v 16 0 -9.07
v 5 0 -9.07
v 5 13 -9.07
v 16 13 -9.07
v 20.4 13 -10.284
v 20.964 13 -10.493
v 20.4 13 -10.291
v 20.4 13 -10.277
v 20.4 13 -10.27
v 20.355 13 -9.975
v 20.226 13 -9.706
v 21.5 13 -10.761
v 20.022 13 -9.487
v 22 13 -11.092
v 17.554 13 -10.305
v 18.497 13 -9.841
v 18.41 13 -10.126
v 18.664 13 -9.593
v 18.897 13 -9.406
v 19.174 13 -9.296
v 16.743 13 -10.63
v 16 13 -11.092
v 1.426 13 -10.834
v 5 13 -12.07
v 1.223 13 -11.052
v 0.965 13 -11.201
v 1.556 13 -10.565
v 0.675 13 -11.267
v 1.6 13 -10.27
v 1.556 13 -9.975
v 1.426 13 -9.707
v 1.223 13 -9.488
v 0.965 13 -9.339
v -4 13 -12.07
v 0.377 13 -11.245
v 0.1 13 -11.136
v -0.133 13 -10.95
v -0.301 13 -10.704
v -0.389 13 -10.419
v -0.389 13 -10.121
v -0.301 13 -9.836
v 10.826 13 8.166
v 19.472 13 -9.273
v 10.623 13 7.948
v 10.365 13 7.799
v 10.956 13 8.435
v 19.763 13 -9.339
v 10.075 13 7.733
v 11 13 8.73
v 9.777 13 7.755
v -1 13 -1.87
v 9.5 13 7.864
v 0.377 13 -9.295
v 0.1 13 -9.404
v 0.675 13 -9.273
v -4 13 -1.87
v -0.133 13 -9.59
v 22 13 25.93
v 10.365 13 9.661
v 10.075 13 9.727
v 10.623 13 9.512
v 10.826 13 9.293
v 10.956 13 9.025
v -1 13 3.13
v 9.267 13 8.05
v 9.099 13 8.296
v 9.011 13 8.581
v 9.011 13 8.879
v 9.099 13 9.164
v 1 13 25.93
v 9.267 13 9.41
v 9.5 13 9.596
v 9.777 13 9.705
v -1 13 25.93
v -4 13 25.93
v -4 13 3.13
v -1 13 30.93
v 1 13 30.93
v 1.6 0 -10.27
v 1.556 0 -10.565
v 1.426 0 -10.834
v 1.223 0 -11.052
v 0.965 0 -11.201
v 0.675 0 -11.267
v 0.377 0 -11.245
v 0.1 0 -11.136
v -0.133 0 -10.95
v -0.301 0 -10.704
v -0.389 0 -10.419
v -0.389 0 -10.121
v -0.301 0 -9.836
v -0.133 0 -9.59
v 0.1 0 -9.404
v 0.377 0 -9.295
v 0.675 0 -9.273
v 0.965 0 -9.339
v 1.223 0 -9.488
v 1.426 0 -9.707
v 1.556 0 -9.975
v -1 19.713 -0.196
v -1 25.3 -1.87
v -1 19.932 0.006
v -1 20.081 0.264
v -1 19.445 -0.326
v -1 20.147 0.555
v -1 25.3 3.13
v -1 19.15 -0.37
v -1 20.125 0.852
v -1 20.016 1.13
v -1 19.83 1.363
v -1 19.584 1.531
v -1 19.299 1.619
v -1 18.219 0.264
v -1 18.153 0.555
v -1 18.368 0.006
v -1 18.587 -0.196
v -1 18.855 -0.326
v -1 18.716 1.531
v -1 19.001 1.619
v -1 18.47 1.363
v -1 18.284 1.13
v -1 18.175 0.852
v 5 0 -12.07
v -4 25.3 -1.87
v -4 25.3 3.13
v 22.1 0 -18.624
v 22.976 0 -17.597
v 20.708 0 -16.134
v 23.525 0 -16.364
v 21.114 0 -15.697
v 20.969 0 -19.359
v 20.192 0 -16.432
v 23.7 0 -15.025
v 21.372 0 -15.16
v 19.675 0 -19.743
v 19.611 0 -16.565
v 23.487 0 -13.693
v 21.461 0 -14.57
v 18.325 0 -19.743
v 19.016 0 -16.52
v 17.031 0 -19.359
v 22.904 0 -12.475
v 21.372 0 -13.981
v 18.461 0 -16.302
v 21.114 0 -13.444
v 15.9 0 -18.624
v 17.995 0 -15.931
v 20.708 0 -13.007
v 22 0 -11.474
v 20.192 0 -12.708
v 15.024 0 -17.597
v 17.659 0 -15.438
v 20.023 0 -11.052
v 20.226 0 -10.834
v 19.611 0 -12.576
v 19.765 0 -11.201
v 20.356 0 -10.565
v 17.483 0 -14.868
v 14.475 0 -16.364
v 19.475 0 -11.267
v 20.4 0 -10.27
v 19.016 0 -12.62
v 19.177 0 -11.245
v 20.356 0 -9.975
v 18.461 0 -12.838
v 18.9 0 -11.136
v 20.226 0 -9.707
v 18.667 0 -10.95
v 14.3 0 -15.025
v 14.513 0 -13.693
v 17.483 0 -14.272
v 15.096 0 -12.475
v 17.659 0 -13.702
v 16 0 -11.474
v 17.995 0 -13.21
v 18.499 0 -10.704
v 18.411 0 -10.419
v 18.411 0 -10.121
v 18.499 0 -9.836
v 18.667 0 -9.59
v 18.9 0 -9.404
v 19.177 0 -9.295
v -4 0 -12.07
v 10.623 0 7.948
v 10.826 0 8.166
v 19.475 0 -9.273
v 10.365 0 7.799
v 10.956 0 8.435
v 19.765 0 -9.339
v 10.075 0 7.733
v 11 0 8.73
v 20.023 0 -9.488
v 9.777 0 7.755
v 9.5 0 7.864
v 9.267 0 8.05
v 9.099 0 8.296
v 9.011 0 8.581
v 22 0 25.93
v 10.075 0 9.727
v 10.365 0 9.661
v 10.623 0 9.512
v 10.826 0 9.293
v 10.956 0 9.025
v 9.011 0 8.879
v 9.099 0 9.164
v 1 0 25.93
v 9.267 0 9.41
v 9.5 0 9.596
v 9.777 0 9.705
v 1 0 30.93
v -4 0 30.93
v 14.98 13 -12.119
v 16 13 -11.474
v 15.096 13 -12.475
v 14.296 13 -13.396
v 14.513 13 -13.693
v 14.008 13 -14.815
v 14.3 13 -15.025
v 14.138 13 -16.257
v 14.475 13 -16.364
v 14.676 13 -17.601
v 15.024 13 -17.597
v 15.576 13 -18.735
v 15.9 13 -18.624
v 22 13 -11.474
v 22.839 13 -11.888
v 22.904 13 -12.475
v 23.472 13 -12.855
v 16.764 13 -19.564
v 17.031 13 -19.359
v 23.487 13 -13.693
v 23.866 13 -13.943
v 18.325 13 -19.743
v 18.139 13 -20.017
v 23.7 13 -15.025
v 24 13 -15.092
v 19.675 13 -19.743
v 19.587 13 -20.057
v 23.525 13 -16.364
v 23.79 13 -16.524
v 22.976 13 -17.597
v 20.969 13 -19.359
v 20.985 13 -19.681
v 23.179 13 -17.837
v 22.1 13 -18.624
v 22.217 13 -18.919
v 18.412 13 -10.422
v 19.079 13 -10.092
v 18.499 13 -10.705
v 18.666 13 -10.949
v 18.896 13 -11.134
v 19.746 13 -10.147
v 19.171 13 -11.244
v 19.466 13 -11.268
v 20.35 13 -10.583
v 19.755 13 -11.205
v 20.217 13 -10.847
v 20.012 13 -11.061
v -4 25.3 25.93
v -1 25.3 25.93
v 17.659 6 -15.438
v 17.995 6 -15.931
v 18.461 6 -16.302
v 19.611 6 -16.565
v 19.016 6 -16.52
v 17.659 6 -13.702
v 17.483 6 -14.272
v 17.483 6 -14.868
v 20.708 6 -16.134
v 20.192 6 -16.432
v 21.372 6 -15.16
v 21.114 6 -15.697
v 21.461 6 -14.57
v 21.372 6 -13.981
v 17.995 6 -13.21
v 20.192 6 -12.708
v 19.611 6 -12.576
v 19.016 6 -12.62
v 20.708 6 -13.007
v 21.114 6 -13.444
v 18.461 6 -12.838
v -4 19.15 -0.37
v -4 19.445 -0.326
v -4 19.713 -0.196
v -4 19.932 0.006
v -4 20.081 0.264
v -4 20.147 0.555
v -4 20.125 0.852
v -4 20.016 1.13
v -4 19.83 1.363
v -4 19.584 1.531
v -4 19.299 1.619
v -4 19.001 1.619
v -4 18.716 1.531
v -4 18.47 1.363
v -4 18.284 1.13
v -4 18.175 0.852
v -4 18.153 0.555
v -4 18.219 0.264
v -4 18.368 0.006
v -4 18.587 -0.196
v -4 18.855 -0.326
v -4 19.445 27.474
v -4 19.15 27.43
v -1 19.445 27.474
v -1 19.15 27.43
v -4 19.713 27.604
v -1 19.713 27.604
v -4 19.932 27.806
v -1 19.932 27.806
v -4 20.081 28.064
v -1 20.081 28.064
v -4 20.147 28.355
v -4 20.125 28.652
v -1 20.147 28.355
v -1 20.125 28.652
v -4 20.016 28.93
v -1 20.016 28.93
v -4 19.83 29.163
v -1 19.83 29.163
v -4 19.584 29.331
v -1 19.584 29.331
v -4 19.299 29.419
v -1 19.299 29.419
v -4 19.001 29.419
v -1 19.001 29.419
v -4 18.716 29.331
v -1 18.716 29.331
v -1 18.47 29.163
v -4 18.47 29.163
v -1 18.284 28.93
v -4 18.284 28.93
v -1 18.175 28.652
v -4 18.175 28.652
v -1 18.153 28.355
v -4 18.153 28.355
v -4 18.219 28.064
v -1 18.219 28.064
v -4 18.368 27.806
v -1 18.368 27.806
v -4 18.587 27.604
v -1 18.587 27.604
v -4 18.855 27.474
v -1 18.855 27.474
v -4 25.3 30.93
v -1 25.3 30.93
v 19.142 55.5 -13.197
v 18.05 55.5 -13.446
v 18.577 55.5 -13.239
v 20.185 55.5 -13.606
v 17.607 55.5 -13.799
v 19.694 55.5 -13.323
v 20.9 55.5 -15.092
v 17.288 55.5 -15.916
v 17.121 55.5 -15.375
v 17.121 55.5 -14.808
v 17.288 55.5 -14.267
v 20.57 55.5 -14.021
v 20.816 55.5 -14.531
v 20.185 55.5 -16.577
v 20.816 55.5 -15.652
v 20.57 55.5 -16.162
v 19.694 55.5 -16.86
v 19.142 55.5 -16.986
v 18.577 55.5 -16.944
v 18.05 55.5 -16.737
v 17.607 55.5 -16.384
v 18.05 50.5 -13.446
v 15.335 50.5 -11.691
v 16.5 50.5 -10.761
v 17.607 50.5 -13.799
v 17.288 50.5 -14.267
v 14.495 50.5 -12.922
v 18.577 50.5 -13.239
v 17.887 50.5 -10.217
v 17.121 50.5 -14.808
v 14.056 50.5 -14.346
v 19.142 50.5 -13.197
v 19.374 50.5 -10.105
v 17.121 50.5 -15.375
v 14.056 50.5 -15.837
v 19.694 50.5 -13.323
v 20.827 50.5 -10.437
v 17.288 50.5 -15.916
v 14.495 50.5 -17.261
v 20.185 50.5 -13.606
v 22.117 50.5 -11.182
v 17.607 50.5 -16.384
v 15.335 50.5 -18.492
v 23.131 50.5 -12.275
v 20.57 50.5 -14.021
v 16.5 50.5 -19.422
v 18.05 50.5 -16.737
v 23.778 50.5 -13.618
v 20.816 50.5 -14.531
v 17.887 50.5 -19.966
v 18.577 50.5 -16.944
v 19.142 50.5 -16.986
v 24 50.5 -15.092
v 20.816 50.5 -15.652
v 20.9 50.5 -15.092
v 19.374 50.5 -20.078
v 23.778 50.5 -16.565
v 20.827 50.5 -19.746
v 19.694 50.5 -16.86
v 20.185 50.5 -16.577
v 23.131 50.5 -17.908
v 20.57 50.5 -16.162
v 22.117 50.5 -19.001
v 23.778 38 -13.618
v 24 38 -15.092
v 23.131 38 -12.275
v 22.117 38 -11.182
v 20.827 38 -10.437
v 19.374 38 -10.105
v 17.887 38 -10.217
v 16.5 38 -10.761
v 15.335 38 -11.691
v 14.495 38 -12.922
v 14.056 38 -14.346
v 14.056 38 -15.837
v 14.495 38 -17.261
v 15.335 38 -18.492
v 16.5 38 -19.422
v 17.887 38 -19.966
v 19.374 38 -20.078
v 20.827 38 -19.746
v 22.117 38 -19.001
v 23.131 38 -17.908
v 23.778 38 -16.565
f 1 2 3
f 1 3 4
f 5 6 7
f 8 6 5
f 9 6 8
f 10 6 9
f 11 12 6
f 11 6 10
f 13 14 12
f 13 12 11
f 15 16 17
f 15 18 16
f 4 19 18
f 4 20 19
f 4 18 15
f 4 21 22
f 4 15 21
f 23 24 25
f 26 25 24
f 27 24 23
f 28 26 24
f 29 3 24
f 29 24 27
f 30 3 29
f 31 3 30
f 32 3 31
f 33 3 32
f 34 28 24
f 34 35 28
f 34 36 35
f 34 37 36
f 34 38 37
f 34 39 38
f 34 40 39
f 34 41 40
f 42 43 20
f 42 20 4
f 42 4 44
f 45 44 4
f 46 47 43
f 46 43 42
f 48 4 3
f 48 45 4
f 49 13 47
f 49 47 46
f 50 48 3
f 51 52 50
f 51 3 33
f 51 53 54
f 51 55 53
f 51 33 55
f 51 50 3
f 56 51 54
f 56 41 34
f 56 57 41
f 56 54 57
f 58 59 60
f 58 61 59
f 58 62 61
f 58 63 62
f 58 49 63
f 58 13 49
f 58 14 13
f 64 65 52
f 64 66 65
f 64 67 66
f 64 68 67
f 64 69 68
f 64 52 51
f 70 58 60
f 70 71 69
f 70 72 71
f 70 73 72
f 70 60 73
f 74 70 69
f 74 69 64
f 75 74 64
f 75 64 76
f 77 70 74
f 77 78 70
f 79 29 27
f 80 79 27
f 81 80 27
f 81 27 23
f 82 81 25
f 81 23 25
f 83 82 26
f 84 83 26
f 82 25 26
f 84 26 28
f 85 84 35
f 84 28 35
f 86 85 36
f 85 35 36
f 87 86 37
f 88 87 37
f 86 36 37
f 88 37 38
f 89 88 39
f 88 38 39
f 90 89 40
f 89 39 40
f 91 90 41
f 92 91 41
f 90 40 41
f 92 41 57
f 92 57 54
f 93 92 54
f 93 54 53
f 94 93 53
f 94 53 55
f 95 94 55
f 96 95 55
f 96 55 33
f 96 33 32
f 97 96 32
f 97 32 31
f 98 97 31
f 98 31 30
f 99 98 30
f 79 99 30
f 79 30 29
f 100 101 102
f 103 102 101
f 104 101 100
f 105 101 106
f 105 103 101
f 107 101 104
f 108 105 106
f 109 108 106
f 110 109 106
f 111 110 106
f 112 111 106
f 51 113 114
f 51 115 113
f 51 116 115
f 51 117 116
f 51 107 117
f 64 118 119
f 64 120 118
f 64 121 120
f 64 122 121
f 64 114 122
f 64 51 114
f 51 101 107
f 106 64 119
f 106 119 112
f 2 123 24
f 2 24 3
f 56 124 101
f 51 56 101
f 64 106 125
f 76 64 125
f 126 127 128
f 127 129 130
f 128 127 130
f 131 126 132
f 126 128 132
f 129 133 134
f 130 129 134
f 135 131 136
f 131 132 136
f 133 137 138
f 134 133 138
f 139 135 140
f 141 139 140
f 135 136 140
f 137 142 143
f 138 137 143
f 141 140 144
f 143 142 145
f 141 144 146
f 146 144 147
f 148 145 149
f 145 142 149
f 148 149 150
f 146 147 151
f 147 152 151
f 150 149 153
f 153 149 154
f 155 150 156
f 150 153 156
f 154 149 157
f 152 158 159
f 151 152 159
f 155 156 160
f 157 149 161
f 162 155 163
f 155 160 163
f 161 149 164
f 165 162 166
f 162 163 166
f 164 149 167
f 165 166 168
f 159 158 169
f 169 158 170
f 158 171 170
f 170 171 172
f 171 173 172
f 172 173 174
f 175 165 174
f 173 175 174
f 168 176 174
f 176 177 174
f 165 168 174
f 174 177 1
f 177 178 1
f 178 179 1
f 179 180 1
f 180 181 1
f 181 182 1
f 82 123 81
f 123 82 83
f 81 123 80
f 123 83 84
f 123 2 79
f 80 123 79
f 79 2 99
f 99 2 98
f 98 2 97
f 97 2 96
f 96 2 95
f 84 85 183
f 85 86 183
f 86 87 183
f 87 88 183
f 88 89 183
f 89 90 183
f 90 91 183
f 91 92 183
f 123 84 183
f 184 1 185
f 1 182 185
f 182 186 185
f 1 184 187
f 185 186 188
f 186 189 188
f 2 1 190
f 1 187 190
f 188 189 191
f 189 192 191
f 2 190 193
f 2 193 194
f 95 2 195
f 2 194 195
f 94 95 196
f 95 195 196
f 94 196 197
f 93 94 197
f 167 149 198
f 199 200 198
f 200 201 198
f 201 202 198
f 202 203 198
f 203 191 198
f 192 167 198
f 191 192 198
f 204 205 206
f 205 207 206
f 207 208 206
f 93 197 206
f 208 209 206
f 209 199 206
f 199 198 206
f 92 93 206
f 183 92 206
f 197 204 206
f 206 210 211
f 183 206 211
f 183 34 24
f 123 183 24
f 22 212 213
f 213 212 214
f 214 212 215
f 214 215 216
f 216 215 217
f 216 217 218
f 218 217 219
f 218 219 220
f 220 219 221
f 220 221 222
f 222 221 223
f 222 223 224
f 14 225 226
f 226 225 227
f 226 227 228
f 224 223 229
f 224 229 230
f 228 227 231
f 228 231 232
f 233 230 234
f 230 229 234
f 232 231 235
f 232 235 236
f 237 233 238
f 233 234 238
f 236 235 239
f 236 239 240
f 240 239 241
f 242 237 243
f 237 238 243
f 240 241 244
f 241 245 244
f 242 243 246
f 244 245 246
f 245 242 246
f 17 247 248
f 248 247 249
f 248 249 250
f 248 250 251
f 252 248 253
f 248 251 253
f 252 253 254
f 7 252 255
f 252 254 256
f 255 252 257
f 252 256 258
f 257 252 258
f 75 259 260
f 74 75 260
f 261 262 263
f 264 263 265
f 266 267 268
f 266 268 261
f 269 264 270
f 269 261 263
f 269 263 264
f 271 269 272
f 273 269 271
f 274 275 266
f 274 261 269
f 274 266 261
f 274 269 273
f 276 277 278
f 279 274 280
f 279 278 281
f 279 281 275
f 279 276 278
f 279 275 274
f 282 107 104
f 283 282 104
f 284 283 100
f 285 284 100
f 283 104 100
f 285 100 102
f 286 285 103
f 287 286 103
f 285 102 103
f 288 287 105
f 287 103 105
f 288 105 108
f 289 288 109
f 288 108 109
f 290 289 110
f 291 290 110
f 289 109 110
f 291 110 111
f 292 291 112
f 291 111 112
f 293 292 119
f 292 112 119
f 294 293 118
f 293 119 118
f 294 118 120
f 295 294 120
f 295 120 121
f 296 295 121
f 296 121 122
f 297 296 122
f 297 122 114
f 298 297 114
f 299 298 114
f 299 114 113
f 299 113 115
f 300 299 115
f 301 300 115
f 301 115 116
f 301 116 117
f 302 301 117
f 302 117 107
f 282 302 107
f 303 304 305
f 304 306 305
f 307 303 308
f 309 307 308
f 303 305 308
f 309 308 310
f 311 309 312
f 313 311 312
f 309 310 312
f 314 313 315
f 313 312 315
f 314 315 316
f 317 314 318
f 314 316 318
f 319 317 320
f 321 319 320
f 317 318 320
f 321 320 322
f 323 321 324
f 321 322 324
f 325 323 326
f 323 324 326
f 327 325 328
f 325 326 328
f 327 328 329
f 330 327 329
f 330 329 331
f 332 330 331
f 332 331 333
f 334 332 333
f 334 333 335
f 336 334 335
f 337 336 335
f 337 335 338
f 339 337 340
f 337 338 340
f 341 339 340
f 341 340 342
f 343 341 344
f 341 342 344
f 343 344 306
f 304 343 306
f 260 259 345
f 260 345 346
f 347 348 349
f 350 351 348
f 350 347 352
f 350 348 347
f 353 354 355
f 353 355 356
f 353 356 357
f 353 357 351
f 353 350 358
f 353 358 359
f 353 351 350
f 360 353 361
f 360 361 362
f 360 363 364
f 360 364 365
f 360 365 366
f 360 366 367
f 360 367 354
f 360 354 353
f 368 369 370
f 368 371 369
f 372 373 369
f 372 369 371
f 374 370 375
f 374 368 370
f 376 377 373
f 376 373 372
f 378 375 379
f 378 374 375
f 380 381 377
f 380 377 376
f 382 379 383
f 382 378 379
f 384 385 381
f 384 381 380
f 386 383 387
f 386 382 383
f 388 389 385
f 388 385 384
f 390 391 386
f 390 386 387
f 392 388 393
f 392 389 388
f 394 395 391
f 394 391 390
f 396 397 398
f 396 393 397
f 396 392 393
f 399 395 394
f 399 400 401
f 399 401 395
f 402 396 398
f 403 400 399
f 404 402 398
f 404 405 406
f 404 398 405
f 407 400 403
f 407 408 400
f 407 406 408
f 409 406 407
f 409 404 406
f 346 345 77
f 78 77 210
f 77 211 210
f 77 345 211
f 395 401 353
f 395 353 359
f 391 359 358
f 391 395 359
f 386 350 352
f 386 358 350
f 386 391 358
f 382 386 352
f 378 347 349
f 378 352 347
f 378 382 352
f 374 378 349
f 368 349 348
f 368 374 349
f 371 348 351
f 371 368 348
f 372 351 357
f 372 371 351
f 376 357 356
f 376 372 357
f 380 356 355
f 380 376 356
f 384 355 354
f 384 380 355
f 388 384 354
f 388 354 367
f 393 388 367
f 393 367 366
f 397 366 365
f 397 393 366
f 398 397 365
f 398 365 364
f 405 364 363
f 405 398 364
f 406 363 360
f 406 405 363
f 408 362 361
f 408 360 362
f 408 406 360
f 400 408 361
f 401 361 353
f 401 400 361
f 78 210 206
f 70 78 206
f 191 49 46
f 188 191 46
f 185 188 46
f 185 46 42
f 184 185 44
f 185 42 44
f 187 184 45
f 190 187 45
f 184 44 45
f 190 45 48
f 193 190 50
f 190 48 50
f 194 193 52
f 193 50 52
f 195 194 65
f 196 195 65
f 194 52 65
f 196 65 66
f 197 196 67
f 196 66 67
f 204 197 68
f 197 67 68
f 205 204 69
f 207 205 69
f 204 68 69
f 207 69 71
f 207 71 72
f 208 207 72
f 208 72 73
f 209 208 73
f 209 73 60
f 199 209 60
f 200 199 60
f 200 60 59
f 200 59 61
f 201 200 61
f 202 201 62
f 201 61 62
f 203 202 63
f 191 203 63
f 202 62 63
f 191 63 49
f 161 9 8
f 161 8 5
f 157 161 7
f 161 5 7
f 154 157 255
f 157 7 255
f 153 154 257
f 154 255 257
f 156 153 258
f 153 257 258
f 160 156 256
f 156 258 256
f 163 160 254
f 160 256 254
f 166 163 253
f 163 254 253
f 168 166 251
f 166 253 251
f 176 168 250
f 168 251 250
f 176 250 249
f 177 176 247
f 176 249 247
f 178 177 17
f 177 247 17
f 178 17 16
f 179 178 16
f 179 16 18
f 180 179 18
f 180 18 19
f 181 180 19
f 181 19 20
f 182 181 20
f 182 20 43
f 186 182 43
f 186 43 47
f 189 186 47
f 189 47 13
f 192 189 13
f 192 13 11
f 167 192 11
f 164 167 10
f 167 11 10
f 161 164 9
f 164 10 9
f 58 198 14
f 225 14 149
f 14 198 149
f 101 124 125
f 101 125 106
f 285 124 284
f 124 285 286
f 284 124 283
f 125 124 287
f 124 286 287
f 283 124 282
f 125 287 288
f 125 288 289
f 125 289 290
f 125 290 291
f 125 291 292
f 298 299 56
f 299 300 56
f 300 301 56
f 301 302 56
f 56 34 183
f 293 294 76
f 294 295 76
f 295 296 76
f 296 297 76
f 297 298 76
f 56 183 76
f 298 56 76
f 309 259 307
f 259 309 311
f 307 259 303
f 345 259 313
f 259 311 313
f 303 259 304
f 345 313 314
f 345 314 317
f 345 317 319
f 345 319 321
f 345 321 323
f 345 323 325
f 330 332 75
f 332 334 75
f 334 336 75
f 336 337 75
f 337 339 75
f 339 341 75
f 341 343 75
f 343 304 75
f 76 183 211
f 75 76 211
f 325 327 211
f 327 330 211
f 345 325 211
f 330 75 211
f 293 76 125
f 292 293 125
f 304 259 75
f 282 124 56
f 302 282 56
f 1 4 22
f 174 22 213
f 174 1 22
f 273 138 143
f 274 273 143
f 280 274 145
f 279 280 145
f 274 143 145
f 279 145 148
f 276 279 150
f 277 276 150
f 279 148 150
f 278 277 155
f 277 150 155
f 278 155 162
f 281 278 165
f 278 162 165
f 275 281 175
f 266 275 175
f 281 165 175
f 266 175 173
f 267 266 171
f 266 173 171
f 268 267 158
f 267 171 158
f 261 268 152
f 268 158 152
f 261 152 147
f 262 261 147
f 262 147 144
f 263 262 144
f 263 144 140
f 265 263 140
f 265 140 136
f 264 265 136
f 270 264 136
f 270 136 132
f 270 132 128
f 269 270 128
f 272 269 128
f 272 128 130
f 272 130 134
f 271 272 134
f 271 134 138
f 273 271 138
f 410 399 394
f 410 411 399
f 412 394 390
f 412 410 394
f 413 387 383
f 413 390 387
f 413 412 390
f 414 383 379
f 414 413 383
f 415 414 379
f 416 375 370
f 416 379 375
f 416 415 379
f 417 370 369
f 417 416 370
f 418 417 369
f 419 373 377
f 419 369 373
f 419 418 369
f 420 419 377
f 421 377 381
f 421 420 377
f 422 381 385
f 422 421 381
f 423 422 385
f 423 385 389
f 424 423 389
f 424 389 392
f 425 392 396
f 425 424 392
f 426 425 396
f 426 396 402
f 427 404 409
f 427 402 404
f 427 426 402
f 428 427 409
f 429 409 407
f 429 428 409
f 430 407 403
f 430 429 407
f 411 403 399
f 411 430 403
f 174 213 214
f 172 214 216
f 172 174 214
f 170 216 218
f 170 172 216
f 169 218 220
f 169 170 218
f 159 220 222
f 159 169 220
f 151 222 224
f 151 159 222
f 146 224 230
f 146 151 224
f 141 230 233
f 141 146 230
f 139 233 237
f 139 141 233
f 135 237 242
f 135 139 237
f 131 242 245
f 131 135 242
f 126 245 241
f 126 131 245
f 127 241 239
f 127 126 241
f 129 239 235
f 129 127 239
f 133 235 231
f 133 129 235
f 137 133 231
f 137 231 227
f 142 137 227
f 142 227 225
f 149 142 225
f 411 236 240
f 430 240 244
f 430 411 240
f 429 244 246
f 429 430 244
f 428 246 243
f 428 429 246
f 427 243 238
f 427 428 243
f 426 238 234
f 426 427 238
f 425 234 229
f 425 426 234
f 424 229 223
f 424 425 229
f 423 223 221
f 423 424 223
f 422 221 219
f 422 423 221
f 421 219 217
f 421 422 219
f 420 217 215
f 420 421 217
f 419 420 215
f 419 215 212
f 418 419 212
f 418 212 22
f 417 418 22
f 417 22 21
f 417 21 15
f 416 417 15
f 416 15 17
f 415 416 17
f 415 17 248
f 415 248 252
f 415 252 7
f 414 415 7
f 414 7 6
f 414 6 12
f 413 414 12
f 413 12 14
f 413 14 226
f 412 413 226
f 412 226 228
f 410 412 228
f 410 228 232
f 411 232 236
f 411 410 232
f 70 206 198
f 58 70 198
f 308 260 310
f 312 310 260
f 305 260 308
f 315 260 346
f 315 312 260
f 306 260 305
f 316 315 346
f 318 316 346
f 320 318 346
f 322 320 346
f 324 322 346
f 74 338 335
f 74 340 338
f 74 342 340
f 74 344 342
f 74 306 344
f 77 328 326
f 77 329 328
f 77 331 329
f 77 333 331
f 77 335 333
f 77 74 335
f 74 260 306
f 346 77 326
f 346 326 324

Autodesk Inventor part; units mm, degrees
ref_plane "YZ Plane" through (0, 0, 0) normal (1, 0, 0) x (0, 1, 0)
ref_plane "XZ Plane" through (0, 0, 0) normal (0, 1, 0) x (-1, 0, 0)
ref_plane "XY Plane" through (0, 0, 0) normal (0, 0, 1) x (1, 0, 0)
sketch "Sketch1" plane through (0, 0, 0) normal (0, 1, 0) x (-1, 0, 0)
  line L0 (4, -12.0702) -> (4, 30.9298)
  line L1 (4, 30.9298) -> (-1, 30.9298)
  line L2 (-1, 30.9298) -> (-1, 25.9298)
  line L3 (-1, 25.9298) -> (-22, 25.9298)
  line L4 (4, -12.0702) -> (-1, -12.0702)
  line L5 (-1, -12.0702) -> (-1, -12.0702)
  line L6 (-22, -8.0702) -> (-22, -8.0702)
  line L7 (-22, -8.0702) -> (-22, 3.3216)
  line L8 (-22, 3.3216) -> (-22, 3.3216)
  line L9 (-22, 3.3216) -> (-22, 25.9298)
  line L10 (-1, -12.0702) -> (-5, -12.0702)
  line L11 (-5, -12.0702) -> (-5, -9.0702)
  line L12 (-5, -9.0702) -> (-16, -9.0702)
  arc A0 (-22, -11.4735) -> (-16, -11.4735) centre (-19, -15.0915) ccw
  line L13 (-16, -9.0702) -> (-16, -11.4735)
  line L14 (-22, -8.0702) -> (-22, -11.4735)
  point P0 (0, 0)
  dimension "d28" = 5
  dimension "d30" = 0
  dimension "d69" = 5
  dimension "d118" = 4
  dimension "d119" = 3
  dimension "d130" = 4.7
  dimension "d148" = 35
  dimension "d151" = 2.4033
extrude "Extrusion1" add sketch "Sketch1" along normal blind 13
sketch "Sketch5" plane through (0, 13, 0) normal (0, 1, 0) x (1, 0, 0)
  line L0 (-4, -30.9298) -> (1, -30.9298) projected
  line L1 (-1, -30.9298) -> (-4, -30.9298)
  line L2 (-4, -30.9298) -> (-4, -25.9298)
  line L3 (-4, -25.9298) -> (-1, -25.9298)
  line L4 (-1, -25.9298) -> (-1, -30.9298)
  line L5 (1, -30.9298) -> (1, -25.9298) projected
  line L6 (-4, 1.8702) -> (-1, 1.8702)
  line L7 (-1, 1.8702) -> (-1, -3.1298)
  line L8 (-1, -3.1298) -> (-4, -3.1298)
  line L9 (-4, -3.1298) -> (-4, 1.8702)
  line L10 (1, 12.0702) -> (1, 17.0702) projected
  line L11 (5, 12.0702) -> (-4, 12.0702) projected
  point P0 (0, 0)
  point P1 (-4, 12.0702)
  dimension "d60" = 5
  dimension "d61" = 3
  dimension "d62" = 2
  dimension "d63" = 2
  dimension "d64" = 3
  dimension "d65" = 5
  dimension "d149" = 22.8
extrude "Extrusion6" add sketch "Sketch5" along normal blind 12.3
sketch "Sketch6" plane through (-1, 13, 30.9298) normal (1, 0, 0) x (0, 0, -1)
  circle A0 centre (2.5, 6.15) radius 1
  line L0 (0, 12.3) -> (5, 12.3) projected
  line L1 (0, 0) -> (0, 12.3) projected
  circle A1 centre (30.3, 6.15) radius 1
  line L2 (27.8, 12.3) -> (32.8, 12.3) projected
  line L3 (27.8, 0) -> (27.8, 12.3) projected
  point P0 (30.9298, -13)
  dimension "d70" = 2
  dimension "d71" = 6.15
  dimension "d72" = 2.5
  dimension "d73" = 2
  dimension "d74" = 6.15
  dimension "d75" = 2.5
extrude "Extrusion7" cut sketch "Sketch6" against normal blind 12.3
thread "Thread6" size "M2x0.4" class "6H" standard "ANSI Metric M Profile" length 10
thread "Thread7" size "M2x0.4" class "6H" standard "ANSI Metric M Profile" length 10
sketch "Sketch10" plane through (0, 13, 0) normal (0, 1, 0) x (1, 0, 0)
  circle A0 centre (0.6, 10.2702) radius 1
  circle A1 centre (19.4, 10.2702) radius 1
  circle A2 centre (10, -8.7298) radius 1
  line L0 (1, -25.9298) -> (22, -25.9298) projected
  line L1 (-4, -3.1298) -> (-4, -25.9298) projected
  line L2 (5, 12.0702) -> (-4, 12.0702) projected
  line L3 (5, 9.0702) -> (5, 12.0702) projected
  line L4 (5, 12.0702) -> (1, 12.0702) projected
  point P0 (0, 0)
  point P1 (1, 17.0702)
  point P2 (-1, 17.0702)
  point P3 (-4, 12.0702)
  dimension "d108" = 2
  dimension "d109" = 2
  dimension "d110" = 2
  dimension "d111" = 9.4
  dimension "d112" = 9.4
  dimension "d113" = 19
  dimension "d117" = 19
  dimension "d121" = 14
  dimension "d150" = 1.8
extrude "Extrusion11" cut sketch "Sketch10" against normal blind 15
sketch "Sketch13" plane through (0, 13, 0) normal (0, 1, 0) x (1, 0, 0)
  point P0 (0, 0)
sketch "Sketch14" plane through (0, 0, 0) normal (0, -1, 0) x (1, 0, 0)
  circle A0 centre (19.4611, -14.5702) radius 2
  circle A1 centre (19.4, -10.2702) radius 1 projected
  point P0 (0, 0)
  dimension "d131" = 4
  dimension "d132" = 4.3
extrude "Extrusion12" cut sketch "Sketch14" against normal blind 6 contours A0
sketch "Sketch15" plane through (0, 13, 0) normal (0, 1, 0) x (1, 0, 0)
  arc A0 (22, 11.4735) -> (16, 11.4735) centre (19, 15.0915) ccw projected
  line L0 (15.3998, 12.0702) -> (22.6002, 12.0702)
  arc A1 (22.6002, 12.0702) -> (15.3998, 12.0702) centre (19, 15.0915) ccw
  line L1 (1, -25.9298) -> (22, -25.9298) projected
  point P0 (0, 0)
  dimension "d135" = 22.8
extrude "Extrusion13" add sketch "Sketch15" along normal blind 12.5
sketch "Sketch16" plane through (0, 25.5, 0) normal (0, 1, 0) x (1, 0, 0)
  arc A0 (22, 11.4735) -> (16, 11.4735) centre (19, 15.0915) ccw projected
  circle A1 centre (19, 15.0915) radius 5
  point P0 (0, 0)
  dimension "d138" = 10
extrude "Extrusion14" add sketch "Sketch16" along normal mid plane 25
sketch "Sketch18" plane through (19, 38, -15.0915) normal (0, 1, 0) x (1, 0, 0)
  circle A0 centre (0, 0) radius 5
  point P0 (-19, -15.0915)
extrude "Extrusion16" add sketch "Sketch18" along normal blind 12.5
sketch "Sketch19" plane through (19, 50.5, -15.0915) normal (0, 1, 0) x (1, 0, 0)
  circle A0 centre (0, 0) radius 1.9
  point P0 (-19, -15.0915)
  dimension "d154" = 3.8
extrude "Extrusion17" add sketch "Sketch19" along normal blind 5
properties part number "4_2.(new).stl"
